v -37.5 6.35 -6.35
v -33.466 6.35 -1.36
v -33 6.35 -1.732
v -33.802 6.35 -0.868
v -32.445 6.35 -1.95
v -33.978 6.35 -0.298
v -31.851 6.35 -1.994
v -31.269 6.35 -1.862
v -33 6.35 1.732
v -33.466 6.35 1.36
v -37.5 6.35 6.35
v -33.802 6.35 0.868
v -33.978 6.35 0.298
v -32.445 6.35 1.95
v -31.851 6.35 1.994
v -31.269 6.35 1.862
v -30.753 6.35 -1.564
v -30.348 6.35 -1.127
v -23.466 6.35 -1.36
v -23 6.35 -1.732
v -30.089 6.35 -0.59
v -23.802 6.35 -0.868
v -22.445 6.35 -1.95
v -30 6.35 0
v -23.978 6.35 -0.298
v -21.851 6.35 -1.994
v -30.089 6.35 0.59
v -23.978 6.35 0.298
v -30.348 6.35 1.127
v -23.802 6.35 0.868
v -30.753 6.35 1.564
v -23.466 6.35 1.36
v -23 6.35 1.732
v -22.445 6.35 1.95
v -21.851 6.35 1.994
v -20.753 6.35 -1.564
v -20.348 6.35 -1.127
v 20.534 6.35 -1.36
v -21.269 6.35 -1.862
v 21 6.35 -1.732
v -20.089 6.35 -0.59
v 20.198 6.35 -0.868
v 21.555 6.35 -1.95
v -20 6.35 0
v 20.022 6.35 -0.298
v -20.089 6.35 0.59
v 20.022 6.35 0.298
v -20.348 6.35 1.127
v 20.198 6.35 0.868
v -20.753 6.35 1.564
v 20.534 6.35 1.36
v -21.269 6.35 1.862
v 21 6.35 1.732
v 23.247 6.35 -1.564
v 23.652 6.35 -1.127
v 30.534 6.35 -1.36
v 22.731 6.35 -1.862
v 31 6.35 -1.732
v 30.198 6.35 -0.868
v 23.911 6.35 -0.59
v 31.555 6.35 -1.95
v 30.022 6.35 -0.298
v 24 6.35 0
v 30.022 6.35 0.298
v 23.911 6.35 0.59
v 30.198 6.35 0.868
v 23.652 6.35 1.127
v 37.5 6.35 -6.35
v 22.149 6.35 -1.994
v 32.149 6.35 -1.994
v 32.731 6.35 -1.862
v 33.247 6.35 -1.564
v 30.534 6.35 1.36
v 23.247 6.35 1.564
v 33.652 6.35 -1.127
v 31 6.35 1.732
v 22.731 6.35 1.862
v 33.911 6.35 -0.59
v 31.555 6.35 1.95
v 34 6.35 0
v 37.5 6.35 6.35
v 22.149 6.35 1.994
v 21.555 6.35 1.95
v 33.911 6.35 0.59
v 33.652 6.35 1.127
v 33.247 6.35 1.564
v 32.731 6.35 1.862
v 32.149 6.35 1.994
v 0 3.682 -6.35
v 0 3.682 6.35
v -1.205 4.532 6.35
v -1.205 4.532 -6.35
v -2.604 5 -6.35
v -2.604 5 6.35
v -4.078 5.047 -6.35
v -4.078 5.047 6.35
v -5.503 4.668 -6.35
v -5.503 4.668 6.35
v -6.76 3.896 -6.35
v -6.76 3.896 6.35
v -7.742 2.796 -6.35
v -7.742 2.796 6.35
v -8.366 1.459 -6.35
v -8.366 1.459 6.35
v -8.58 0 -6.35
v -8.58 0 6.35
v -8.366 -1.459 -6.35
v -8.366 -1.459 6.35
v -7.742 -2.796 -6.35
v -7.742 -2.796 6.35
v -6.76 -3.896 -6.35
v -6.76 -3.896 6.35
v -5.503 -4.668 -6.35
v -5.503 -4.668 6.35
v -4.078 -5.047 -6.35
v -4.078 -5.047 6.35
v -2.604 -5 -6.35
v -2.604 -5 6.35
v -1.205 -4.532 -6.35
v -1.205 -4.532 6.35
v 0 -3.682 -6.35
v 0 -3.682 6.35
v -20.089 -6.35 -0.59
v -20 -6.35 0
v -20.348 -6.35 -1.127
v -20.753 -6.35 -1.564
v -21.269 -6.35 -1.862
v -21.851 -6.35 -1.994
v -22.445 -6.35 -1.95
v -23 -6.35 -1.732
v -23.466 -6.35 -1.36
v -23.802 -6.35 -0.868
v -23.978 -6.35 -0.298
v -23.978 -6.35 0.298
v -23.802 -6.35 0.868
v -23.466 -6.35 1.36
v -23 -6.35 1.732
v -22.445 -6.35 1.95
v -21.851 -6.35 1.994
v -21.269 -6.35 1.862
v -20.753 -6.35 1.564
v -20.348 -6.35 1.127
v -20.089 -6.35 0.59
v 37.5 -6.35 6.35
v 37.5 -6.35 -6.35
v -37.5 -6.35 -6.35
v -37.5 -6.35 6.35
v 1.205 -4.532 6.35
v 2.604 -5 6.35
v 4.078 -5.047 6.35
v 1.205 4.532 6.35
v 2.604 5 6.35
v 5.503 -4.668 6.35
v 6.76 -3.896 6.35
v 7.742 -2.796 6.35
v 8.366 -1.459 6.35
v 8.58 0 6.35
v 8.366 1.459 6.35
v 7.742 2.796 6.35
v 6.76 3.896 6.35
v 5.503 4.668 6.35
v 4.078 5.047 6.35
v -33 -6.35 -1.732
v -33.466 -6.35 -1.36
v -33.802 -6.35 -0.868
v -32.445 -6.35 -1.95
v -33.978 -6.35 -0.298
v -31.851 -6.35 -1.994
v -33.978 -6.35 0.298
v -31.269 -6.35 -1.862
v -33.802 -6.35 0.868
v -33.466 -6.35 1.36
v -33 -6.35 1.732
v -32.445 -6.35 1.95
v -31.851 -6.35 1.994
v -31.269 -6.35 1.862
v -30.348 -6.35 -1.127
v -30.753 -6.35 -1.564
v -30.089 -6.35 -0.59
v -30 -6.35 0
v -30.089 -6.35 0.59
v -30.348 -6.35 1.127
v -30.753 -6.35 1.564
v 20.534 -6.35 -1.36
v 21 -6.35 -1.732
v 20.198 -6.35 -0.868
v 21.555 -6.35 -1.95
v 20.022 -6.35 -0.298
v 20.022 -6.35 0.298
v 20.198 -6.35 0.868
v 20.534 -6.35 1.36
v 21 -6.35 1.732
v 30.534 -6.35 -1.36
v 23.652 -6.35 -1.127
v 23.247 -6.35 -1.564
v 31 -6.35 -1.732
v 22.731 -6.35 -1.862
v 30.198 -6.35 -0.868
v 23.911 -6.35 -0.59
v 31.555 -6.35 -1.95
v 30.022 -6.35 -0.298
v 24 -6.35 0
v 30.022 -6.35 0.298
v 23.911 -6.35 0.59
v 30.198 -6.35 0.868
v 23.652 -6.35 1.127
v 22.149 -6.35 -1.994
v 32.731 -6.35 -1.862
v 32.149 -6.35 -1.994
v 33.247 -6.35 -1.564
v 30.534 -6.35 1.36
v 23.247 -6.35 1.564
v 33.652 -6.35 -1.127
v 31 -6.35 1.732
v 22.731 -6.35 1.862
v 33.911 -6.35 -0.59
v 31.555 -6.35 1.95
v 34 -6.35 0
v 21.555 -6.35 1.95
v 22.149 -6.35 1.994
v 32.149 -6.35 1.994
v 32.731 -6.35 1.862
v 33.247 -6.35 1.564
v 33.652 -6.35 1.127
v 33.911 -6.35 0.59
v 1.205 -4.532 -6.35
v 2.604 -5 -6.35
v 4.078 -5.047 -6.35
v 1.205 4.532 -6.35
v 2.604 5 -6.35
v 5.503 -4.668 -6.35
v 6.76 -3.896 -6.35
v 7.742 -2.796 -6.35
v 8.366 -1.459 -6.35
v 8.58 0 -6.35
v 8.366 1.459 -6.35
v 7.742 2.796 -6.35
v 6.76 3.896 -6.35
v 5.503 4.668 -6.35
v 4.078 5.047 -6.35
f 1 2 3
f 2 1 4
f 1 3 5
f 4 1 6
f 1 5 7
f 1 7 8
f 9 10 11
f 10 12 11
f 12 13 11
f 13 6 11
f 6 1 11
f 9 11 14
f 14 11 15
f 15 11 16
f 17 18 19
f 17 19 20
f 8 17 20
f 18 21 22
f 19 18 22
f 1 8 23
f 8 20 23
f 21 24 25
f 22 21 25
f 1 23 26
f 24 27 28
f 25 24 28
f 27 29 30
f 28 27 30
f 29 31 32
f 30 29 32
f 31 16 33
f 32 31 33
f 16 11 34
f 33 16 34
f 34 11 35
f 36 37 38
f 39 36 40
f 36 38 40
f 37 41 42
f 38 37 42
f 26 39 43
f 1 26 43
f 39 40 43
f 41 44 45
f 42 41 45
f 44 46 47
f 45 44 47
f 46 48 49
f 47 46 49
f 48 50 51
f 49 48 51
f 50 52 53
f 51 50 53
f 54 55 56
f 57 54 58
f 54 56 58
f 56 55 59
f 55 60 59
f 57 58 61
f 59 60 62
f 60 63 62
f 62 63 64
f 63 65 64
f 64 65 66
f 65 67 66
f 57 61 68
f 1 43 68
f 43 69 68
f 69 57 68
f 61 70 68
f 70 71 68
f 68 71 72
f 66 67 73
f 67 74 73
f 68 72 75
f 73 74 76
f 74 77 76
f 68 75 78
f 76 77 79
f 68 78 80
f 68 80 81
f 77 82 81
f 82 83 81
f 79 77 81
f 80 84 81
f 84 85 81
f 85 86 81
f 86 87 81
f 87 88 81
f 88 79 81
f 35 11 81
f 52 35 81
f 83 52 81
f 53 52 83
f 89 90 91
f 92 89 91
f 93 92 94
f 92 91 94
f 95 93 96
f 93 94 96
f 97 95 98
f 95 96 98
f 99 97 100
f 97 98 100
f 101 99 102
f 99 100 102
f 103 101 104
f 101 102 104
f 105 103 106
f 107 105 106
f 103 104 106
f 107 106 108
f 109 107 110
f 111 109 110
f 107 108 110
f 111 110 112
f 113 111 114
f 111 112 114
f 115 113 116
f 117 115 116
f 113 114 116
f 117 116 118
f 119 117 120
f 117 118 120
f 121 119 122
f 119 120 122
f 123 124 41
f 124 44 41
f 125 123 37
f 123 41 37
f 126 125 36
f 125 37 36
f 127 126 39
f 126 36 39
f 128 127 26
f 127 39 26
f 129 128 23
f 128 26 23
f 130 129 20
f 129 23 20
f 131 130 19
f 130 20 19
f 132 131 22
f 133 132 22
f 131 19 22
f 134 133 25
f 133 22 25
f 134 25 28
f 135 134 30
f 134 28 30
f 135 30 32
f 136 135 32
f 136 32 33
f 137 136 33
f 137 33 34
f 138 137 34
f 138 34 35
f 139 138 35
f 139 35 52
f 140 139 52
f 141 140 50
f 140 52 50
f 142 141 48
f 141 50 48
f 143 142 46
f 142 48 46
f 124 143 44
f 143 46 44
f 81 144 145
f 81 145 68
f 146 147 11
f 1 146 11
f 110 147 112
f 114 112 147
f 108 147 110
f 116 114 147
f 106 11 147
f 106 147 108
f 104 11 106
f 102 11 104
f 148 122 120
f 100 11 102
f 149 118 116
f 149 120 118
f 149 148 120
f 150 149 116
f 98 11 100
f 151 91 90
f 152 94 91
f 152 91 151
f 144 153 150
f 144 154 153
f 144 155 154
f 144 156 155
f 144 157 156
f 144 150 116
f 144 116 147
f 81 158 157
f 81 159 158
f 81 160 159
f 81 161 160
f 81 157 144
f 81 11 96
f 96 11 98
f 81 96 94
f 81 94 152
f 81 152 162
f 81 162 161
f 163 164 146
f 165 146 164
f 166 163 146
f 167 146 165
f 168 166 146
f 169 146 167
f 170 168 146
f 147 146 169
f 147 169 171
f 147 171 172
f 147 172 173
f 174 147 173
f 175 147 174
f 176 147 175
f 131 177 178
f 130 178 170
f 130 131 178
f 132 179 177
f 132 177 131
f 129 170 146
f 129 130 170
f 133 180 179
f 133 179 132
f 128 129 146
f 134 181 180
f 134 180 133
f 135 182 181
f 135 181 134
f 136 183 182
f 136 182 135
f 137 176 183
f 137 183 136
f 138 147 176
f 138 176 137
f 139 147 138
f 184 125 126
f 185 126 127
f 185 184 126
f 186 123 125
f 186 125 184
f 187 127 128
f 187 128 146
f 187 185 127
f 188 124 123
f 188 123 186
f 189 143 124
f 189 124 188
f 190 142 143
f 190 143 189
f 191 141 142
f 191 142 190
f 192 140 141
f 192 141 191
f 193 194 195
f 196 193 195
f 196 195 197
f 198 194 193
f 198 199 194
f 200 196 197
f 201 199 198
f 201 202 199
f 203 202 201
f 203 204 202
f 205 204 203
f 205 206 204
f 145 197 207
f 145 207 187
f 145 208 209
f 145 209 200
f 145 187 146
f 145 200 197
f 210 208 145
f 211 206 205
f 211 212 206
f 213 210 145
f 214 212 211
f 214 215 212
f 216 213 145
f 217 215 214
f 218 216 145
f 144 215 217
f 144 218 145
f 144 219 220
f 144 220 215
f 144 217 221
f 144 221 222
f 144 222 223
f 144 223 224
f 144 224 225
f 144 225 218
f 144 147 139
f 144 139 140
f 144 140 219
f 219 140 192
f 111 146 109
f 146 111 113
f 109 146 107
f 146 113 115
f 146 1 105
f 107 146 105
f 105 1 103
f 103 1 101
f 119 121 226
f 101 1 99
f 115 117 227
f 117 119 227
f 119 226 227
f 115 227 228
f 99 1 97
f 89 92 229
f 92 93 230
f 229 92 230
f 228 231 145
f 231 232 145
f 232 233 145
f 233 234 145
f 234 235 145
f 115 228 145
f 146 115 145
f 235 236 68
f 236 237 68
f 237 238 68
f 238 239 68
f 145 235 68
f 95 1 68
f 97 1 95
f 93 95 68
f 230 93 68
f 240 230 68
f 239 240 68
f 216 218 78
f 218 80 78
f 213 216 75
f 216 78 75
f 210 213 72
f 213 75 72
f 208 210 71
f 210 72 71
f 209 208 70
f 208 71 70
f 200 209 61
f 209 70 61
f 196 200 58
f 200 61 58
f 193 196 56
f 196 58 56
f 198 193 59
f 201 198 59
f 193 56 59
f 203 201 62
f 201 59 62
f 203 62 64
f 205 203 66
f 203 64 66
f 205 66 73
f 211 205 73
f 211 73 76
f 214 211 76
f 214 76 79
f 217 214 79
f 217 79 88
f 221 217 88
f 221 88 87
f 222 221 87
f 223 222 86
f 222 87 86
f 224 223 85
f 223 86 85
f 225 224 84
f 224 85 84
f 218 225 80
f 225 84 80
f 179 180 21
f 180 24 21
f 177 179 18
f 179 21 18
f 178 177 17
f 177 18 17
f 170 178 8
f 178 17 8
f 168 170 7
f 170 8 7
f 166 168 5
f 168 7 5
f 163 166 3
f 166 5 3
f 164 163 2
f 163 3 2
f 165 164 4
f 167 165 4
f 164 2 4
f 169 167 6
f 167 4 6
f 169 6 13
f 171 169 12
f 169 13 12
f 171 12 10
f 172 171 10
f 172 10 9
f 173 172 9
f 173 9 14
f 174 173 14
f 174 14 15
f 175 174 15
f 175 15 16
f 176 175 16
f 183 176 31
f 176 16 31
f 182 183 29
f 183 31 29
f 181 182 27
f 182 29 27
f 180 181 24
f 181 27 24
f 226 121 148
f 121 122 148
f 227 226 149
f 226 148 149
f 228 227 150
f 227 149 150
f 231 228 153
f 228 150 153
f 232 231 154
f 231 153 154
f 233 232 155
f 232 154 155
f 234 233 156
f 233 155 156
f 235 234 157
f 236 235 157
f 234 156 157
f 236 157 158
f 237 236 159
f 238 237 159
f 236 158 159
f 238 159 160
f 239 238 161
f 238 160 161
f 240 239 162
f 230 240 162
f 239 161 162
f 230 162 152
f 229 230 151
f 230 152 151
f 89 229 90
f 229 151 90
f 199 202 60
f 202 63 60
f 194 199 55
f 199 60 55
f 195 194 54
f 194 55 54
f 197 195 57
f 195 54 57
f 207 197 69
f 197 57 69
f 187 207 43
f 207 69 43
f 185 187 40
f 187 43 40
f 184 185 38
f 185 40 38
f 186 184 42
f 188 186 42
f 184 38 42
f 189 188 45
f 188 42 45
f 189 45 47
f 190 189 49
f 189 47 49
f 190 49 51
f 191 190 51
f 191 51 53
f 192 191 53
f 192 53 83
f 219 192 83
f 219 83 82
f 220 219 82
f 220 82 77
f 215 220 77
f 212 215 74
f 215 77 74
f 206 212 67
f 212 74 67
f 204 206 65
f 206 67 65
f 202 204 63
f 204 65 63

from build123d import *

# Parameters (mm, degrees)
SKETCH1_W               = 75
SKETCH1_H               = 12.7
LOADCELL_DEPTH          = 6.35
SKETCH2_R               = 2
CUT_EXTRUDE1_DEPTH      = 7.35
CUT_EXTRUDE1_DEPTH_BACK = 7.35


with BuildPart() as part:
    # Sketch1 → LoadCell (new body, symmetric)
    with BuildSketch(Plane.XY):
        Rectangle(SKETCH1_W, SKETCH1_H)
        with BuildLine():
            ThreePointArc((0, 3.681901683), (-8.58, 0), (0, -3.681901683))
            ThreePointArc((0, -3.681901683), (8.58, 0), (0, 3.681901683))
        make_face(mode=Mode.SUBTRACT)
    extrude(amount=LOADCELL_DEPTH, both=True)

    # Sketch2 → Cut-Extrude1 (cut, two sides)
    with BuildSketch(Plane(origin=(0, 0, 0), x_dir=(1, 0, 0), z_dir=(0, 1, 0))) as cut_extrude1_sk:
        with Locations((-31.999999942, 0)):
            Circle(SKETCH2_R)
        with Locations((-21.999999942, 0)):
            Circle(SKETCH2_R)
        with Locations((31.999999942, 0)):
            Circle(SKETCH2_R)
        with Locations((21.999999942, 0)):
            Circle(SKETCH2_R)
    extrude(amount=CUT_EXTRUDE1_DEPTH, mode=Mode.SUBTRACT)
    extrude(cut_extrude1_sk.sketch, amount=-CUT_EXTRUDE1_DEPTH_BACK, mode=Mode.SUBTRACT)


solid = part.part
